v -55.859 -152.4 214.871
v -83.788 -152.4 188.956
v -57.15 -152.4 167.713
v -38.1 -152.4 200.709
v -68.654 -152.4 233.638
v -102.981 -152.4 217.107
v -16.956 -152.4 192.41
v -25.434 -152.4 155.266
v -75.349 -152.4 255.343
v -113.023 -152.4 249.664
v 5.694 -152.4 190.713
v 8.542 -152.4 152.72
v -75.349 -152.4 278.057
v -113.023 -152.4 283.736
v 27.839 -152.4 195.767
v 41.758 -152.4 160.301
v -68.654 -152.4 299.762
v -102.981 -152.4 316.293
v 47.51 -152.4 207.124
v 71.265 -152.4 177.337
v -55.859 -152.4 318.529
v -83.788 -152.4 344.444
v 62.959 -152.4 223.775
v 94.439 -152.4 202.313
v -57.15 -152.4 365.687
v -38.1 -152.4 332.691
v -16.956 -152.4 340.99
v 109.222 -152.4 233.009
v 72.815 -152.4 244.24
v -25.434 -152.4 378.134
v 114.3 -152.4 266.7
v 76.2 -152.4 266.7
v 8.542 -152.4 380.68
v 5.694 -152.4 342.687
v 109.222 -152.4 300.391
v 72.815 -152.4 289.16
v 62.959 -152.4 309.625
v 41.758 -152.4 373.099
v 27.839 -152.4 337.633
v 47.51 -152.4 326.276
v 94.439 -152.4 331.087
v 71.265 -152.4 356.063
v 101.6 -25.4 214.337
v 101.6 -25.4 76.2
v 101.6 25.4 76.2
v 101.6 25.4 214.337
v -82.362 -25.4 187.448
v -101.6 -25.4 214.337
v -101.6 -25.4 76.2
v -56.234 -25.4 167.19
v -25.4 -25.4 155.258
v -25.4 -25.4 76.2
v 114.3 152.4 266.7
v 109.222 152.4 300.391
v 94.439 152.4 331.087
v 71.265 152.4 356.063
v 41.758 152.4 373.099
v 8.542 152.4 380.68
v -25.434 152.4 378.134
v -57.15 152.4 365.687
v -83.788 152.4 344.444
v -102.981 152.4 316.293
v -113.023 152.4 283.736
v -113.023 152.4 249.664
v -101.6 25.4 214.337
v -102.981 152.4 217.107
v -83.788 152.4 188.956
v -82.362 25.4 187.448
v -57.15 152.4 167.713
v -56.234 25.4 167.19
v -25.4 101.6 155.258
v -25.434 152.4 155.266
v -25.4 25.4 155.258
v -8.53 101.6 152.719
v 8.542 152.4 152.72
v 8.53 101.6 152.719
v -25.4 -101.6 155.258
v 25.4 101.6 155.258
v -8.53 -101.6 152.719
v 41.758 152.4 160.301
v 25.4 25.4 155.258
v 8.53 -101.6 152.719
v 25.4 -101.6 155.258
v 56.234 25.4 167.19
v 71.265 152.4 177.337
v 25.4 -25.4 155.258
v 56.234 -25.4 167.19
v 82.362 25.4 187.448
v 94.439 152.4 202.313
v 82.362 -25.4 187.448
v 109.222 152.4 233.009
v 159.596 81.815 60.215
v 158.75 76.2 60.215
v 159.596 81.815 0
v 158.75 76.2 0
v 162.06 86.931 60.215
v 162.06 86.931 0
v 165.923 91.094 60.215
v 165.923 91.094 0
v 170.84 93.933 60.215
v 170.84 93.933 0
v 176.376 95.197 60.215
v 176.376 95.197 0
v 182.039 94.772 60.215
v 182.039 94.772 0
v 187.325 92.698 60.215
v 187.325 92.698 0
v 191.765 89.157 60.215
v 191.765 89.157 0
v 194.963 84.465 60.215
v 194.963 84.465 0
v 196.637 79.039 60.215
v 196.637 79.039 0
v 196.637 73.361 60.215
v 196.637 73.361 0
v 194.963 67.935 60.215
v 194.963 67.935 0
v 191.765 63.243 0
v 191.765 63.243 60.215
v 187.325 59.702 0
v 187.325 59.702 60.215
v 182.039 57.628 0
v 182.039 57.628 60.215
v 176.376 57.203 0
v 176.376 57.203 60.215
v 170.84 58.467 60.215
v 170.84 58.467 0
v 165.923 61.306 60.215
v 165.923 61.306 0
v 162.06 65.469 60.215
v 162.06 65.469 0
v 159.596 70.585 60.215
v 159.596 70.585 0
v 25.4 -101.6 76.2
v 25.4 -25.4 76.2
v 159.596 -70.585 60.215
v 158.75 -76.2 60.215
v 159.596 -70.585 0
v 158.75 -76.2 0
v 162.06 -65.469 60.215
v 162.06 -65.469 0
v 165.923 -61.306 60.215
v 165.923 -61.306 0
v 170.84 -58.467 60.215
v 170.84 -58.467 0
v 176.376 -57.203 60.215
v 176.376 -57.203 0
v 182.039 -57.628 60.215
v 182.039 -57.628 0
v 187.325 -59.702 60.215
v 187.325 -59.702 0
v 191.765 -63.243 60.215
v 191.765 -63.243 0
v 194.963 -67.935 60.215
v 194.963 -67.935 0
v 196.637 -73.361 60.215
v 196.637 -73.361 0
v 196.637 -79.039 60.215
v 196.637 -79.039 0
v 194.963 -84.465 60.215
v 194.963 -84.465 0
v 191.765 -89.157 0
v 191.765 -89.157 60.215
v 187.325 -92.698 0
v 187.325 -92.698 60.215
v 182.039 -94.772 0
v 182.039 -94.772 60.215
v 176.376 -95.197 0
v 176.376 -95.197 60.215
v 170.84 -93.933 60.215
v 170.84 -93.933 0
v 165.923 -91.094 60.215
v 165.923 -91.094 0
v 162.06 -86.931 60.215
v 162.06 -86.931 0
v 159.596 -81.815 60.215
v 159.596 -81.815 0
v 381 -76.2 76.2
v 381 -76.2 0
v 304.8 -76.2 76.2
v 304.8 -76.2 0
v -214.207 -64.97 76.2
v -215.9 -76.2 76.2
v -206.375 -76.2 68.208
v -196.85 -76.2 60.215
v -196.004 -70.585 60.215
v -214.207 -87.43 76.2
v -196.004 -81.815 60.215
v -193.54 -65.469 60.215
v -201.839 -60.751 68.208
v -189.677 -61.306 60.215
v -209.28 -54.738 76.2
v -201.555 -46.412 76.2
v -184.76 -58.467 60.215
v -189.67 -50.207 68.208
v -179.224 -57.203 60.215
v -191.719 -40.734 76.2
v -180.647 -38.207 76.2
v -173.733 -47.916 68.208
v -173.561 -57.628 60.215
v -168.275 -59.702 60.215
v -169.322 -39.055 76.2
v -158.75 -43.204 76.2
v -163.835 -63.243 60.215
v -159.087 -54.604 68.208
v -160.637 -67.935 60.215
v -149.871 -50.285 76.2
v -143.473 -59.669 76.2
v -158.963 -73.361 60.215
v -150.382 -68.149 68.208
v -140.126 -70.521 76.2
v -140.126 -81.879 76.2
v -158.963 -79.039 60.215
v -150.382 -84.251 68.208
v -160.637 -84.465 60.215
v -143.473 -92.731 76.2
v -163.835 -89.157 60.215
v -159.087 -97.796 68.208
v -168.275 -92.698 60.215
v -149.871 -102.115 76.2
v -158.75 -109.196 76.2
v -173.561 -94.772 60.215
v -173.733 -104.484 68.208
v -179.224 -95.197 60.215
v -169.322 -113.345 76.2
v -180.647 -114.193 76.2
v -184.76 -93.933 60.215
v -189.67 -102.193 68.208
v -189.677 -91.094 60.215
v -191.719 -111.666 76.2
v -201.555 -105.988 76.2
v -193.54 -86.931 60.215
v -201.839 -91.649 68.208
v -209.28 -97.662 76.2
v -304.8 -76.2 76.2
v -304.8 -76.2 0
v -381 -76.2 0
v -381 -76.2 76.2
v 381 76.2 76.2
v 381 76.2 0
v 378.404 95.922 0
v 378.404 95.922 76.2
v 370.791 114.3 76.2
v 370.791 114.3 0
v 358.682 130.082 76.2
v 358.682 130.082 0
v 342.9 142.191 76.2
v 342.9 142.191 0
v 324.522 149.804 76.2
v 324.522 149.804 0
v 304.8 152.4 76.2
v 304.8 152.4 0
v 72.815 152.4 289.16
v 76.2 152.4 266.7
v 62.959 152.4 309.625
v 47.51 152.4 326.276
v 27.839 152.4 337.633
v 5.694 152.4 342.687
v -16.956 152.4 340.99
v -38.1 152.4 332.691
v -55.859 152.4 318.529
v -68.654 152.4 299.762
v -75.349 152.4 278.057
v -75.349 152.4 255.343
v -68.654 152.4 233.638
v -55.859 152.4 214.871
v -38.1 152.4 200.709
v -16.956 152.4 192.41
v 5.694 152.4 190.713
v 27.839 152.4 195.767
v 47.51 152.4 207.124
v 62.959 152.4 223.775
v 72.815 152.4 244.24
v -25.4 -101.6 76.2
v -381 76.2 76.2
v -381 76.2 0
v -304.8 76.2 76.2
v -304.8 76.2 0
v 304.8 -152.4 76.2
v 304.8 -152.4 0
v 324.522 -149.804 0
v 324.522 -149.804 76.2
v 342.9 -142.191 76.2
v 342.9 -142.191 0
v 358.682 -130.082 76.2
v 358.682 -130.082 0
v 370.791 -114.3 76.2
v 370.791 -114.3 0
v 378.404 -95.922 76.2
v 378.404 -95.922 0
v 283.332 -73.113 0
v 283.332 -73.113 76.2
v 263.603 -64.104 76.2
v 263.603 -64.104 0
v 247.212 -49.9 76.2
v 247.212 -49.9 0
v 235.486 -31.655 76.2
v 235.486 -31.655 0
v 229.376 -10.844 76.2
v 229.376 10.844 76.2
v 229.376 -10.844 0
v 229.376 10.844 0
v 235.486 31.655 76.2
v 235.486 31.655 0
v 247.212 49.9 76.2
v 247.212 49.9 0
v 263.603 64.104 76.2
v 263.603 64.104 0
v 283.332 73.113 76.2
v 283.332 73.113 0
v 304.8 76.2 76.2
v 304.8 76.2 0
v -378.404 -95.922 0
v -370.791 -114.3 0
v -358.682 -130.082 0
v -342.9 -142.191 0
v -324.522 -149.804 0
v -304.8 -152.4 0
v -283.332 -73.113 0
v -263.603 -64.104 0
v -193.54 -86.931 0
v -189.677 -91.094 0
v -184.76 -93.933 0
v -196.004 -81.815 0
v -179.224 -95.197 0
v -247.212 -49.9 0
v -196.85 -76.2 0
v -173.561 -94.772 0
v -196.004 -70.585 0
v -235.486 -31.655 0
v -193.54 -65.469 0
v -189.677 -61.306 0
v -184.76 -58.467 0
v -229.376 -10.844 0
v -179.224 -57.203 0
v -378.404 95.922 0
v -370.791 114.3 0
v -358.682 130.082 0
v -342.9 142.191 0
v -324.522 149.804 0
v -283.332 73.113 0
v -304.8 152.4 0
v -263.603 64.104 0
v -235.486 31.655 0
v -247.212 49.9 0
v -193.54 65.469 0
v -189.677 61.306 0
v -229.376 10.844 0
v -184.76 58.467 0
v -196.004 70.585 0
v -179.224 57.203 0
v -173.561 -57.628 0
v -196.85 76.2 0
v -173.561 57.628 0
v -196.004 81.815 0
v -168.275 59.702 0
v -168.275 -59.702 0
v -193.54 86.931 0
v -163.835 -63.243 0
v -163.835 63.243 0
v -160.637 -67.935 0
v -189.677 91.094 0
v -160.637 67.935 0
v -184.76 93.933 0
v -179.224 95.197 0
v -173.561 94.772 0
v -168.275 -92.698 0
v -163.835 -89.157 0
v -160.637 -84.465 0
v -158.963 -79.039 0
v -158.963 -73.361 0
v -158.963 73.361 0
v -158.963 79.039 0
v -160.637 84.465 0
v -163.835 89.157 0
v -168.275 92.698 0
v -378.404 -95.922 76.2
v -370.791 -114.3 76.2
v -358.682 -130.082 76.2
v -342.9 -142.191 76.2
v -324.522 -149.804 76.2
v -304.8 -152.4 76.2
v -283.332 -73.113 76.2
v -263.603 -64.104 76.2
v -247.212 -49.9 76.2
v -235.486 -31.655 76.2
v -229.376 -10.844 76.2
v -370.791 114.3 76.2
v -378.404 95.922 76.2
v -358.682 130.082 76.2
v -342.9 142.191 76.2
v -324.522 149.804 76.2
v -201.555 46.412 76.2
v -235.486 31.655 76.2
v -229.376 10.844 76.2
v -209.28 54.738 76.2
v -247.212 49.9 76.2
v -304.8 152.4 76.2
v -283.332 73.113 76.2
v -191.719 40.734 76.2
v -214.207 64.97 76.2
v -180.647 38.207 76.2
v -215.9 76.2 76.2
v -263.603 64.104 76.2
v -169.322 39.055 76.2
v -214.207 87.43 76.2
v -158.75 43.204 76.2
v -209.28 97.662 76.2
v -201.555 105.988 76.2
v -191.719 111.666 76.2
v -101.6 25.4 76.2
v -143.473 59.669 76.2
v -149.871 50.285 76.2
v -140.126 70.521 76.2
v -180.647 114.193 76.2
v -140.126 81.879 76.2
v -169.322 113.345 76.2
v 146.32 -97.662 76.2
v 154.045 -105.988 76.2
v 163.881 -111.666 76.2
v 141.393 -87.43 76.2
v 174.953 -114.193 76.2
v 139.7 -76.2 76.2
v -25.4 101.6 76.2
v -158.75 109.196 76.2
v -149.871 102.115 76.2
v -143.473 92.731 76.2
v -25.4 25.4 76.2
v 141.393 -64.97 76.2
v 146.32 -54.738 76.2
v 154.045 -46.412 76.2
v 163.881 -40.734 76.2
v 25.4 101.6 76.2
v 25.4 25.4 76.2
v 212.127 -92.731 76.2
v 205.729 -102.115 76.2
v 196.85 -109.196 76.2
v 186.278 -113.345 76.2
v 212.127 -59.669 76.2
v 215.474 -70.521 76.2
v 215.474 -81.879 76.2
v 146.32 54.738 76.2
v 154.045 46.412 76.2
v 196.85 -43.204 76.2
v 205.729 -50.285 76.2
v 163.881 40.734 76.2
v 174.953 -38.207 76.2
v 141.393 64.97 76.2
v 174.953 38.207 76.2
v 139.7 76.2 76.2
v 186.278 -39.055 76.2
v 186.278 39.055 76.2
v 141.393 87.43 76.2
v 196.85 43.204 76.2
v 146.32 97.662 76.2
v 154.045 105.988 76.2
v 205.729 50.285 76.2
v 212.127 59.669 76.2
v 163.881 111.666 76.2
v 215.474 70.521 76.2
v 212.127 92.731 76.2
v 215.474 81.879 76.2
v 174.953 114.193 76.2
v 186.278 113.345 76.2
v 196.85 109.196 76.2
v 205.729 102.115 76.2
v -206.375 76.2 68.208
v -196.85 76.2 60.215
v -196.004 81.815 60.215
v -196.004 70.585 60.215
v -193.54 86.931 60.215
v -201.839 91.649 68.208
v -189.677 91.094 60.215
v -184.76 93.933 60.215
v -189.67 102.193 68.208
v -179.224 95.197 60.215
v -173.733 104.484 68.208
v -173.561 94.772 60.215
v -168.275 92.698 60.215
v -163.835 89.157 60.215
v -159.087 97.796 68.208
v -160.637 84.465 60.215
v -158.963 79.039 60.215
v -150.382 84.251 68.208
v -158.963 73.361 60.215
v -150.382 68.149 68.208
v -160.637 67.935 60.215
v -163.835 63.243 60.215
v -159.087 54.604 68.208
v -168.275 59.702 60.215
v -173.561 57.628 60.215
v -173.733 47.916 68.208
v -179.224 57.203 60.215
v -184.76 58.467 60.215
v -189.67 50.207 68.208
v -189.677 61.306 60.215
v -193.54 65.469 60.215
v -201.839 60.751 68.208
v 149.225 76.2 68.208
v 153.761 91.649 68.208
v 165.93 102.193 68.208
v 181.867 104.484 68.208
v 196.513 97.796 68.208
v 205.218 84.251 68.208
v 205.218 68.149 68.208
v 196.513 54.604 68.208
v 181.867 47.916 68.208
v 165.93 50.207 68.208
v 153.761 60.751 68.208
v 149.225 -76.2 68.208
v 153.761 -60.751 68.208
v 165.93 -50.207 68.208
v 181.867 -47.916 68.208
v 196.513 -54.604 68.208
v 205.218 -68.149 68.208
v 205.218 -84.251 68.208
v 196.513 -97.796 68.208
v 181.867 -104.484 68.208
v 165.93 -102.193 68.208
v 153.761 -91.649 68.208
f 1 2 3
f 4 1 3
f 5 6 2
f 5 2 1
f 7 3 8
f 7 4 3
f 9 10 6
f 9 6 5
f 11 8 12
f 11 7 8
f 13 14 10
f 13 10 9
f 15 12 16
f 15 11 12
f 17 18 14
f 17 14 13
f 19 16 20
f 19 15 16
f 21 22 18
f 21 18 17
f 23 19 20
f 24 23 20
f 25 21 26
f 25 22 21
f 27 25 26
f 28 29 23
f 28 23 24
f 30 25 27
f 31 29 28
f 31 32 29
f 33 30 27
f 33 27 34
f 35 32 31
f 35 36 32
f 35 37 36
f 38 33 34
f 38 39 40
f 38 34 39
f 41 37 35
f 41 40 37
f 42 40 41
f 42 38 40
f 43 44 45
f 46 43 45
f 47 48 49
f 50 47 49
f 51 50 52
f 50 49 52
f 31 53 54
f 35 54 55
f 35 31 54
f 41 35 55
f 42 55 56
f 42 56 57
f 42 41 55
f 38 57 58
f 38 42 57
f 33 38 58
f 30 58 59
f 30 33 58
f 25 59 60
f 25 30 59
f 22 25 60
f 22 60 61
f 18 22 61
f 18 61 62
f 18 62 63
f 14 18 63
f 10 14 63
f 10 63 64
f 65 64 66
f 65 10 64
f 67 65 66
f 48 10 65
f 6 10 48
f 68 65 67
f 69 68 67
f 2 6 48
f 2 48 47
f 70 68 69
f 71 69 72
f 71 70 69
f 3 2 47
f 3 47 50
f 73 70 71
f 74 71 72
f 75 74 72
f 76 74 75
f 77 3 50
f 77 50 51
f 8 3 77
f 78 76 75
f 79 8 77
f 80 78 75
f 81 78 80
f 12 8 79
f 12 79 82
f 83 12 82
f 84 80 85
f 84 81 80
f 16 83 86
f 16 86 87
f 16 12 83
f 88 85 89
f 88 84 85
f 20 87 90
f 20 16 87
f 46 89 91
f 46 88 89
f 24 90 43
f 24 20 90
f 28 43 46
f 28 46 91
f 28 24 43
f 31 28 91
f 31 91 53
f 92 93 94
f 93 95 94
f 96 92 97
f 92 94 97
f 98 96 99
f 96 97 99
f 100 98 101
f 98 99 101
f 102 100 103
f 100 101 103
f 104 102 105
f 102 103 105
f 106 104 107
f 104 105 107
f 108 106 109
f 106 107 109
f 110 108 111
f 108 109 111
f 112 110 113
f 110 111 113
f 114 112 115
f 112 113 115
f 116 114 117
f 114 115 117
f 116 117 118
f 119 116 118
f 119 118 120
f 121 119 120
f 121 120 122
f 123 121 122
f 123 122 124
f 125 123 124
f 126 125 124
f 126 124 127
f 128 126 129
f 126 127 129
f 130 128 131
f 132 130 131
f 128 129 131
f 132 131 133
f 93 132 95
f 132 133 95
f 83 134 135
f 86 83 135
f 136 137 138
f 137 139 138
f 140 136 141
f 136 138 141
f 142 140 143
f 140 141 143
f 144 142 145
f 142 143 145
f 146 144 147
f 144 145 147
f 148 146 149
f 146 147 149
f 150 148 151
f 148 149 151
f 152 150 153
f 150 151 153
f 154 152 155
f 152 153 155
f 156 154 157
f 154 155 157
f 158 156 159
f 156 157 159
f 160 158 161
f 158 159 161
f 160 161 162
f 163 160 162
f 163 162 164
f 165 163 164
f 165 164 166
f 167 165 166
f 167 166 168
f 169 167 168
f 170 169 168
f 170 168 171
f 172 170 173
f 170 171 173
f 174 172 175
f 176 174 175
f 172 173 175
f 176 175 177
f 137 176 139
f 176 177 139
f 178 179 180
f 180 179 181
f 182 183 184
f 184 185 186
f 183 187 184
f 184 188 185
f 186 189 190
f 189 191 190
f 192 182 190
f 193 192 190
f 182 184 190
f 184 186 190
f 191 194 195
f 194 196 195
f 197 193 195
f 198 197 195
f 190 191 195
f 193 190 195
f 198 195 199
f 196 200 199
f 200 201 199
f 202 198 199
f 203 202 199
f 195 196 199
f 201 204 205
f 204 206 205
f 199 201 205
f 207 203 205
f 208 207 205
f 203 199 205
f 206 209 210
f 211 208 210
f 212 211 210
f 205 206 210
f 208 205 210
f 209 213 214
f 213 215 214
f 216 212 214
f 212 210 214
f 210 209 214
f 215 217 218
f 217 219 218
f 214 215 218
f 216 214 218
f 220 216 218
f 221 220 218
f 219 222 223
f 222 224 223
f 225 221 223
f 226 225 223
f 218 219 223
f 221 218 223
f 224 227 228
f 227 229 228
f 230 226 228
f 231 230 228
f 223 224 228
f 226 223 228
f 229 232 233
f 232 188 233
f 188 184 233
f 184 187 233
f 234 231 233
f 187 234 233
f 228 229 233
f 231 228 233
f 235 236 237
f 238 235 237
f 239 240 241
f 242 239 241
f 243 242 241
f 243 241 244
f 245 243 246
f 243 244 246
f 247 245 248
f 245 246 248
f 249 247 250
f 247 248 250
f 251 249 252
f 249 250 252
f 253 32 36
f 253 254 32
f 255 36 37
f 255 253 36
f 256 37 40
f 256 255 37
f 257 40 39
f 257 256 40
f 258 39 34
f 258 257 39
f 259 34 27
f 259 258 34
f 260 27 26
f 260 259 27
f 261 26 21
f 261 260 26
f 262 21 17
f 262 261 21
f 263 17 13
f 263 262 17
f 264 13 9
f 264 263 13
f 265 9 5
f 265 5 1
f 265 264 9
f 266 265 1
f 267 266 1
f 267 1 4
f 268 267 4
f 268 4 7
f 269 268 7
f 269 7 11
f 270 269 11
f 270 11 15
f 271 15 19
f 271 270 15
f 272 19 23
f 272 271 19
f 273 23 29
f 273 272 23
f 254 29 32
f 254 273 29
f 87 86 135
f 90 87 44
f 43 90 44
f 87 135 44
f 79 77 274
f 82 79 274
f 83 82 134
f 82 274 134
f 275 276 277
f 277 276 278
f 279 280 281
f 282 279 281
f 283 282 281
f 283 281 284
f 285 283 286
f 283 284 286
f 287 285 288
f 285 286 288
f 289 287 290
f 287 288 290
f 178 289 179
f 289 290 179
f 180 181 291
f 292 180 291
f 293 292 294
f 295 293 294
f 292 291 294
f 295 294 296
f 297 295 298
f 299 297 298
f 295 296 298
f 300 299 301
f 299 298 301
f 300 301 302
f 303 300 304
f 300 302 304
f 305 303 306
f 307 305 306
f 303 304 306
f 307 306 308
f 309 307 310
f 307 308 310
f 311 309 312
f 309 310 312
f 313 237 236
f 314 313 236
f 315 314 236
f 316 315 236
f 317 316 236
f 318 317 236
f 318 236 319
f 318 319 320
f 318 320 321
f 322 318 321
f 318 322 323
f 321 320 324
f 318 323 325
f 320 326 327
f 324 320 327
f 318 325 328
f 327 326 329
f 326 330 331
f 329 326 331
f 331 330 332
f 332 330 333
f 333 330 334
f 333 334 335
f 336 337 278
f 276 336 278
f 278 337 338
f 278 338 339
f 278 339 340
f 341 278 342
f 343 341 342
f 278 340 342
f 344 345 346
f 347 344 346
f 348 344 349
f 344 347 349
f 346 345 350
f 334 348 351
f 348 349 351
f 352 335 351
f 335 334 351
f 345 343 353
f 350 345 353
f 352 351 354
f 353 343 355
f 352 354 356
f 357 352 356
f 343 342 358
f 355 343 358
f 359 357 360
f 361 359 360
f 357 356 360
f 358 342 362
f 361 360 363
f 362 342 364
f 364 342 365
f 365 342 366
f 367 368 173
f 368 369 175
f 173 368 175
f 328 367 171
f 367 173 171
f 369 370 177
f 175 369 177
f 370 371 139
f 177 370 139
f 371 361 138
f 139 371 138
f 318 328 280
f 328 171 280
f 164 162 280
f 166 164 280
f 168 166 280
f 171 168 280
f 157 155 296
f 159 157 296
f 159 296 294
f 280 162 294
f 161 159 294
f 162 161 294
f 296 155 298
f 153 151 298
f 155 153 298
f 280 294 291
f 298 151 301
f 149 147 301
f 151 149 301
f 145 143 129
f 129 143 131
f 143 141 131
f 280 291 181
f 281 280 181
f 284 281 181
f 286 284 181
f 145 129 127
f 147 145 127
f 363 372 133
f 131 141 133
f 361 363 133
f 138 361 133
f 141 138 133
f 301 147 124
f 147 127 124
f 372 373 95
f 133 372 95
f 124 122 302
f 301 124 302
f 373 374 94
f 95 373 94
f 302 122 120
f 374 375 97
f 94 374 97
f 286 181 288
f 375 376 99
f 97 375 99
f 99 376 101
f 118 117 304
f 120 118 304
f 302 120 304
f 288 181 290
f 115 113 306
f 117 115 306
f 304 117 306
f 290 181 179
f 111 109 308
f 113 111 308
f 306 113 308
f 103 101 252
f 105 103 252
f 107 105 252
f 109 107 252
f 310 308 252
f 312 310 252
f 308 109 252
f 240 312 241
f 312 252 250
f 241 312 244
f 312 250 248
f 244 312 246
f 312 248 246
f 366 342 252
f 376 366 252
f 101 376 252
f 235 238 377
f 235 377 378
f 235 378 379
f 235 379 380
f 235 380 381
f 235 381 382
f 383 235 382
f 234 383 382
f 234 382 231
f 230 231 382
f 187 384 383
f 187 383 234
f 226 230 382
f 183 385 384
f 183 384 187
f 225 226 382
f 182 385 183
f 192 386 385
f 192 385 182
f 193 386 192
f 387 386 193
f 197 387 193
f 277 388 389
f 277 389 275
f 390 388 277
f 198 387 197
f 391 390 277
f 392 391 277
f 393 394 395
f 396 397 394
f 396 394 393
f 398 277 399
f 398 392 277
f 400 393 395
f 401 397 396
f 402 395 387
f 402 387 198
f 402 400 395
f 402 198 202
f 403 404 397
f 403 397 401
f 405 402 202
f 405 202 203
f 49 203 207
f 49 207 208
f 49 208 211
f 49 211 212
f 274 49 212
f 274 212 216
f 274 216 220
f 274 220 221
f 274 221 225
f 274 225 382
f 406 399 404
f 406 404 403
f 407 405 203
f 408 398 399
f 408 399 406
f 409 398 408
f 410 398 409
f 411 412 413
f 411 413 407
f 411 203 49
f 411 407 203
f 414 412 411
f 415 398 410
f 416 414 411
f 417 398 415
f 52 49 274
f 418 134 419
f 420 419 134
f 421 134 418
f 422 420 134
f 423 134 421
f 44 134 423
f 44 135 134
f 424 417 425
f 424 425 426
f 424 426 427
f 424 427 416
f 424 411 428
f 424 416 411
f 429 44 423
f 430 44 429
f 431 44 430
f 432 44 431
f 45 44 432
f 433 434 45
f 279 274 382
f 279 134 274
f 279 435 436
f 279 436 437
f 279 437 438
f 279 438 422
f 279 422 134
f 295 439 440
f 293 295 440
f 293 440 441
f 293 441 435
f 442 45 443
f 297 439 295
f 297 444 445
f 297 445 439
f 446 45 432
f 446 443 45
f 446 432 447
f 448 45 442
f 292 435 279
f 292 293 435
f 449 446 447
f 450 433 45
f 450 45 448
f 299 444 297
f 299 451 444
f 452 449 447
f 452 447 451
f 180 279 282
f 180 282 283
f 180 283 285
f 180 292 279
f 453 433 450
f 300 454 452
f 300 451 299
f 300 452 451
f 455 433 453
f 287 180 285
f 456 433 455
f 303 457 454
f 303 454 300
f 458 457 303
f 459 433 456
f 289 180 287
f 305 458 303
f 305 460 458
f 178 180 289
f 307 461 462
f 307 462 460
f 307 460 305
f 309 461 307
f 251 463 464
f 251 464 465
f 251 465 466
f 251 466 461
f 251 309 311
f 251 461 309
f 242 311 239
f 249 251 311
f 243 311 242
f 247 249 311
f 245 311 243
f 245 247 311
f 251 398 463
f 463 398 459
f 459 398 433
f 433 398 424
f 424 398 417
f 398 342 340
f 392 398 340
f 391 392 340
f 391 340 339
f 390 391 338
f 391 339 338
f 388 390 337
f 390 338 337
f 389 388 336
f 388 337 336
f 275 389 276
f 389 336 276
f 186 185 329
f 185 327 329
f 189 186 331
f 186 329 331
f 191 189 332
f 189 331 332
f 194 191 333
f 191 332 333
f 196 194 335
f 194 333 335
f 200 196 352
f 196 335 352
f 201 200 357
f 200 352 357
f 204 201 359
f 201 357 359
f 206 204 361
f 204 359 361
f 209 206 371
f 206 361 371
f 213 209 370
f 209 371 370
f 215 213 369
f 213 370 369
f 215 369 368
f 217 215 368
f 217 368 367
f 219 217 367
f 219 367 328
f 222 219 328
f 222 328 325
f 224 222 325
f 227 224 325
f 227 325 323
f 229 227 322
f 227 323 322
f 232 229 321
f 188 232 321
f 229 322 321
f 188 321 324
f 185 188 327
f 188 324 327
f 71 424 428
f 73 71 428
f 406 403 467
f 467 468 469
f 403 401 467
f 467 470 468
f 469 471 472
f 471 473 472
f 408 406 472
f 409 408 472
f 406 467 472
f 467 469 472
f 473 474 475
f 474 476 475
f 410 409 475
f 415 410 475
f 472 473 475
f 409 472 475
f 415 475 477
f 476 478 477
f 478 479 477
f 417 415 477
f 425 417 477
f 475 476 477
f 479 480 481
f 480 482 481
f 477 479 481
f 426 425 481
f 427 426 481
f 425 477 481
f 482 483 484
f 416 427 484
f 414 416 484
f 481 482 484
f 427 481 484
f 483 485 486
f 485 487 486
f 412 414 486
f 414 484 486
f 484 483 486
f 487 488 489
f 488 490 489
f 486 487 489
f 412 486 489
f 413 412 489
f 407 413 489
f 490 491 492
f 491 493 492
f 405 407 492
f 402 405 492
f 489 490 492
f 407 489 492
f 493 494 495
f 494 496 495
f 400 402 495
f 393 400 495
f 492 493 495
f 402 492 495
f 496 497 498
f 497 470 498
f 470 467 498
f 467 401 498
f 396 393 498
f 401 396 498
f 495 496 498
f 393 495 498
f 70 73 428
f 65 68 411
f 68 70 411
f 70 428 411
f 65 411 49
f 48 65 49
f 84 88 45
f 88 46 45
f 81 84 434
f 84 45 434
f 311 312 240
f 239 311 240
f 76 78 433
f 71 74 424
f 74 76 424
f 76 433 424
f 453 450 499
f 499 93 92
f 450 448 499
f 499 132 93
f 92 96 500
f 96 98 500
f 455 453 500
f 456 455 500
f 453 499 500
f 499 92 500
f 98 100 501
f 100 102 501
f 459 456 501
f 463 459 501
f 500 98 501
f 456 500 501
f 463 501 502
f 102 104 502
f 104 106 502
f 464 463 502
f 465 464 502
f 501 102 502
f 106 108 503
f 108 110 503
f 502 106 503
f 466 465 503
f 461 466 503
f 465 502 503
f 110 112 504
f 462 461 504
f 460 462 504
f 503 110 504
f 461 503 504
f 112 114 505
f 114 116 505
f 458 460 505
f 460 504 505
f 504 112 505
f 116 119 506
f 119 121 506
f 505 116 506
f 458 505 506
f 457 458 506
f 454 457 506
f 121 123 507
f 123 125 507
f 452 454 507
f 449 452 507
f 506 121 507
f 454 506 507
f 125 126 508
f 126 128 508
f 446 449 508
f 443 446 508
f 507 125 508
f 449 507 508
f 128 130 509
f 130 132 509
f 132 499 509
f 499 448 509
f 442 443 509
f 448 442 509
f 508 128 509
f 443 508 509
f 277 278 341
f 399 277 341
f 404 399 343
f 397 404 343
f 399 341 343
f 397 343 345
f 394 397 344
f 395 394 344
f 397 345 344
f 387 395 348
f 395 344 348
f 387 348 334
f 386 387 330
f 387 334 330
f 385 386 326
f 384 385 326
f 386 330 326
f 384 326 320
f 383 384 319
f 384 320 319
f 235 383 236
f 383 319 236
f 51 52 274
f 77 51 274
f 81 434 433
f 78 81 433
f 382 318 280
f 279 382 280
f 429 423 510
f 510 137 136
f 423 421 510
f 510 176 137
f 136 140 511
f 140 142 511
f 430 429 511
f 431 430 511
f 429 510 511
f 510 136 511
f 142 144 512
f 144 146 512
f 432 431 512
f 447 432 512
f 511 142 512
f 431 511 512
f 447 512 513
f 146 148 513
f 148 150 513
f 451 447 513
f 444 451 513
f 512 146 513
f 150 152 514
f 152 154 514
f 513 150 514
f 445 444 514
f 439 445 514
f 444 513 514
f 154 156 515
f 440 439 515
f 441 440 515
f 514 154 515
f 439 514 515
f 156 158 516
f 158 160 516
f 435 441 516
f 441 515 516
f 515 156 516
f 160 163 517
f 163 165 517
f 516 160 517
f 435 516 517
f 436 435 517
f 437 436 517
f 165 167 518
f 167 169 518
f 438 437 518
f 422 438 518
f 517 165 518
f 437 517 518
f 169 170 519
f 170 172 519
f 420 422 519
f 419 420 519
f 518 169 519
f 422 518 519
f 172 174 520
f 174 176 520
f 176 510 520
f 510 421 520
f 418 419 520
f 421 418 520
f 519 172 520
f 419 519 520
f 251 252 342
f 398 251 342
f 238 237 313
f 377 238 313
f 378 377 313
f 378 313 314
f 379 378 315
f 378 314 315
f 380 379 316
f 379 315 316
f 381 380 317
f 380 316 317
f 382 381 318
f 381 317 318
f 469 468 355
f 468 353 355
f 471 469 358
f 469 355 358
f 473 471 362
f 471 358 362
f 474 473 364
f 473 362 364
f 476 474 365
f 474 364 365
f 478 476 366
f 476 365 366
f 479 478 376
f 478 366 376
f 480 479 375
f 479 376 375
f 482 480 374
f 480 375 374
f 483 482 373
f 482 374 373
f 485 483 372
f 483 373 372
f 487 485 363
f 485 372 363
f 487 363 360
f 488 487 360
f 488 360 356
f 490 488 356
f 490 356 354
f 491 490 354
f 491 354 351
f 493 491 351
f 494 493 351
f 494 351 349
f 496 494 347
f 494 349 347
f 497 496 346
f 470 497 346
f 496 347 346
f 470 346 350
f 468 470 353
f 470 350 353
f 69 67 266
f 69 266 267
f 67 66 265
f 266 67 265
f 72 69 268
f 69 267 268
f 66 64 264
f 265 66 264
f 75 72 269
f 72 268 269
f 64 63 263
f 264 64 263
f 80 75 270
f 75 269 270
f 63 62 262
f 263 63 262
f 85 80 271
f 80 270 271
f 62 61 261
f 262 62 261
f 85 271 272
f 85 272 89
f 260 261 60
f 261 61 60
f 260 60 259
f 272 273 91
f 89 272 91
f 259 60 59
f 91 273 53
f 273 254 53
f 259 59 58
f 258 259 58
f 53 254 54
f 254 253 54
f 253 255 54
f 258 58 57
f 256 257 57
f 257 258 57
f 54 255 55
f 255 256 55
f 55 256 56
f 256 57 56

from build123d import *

# Parameters (mm, degrees)
F0_R           = 38.1
F1_DEPTH       = 76.2
F2_DEPTH       = 266.7
F4_D           = 38.1
F4_CSINK_D     = 76.2
F4_CSINK_ANGLE = 100
F5_R           = 114.3
F5_R_2         = 76.2
F6_DEPTH       = 152.4
F7_DEPTH       = 152.4


with BuildPart() as f1:
    # F0 (on Top) → F1 (new body)
    with BuildSketch(Plane.XY):
        with BuildLine():
            ThreePointArc((-304.8, 76.2), (-228.6, 0), (-304.8, -76.2))
            Line((-304.8, -76.2), (-381, -76.2))
            ThreePointArc((-381, -76.2), (-358.681537, -130.081537), (-304.8, -152.4))
            Line((-304.8, -152.4), (304.8, -152.4))
            ThreePointArc((304.8, -152.4), (358.681537, -130.081537), (381, -76.2))
            Line((381, -76.2), (304.8, -76.2))
            ThreePointArc((304.8, -76.2), (228.6, 0), (304.8, 76.2))
            Line((304.8, 76.2), (381, 76.2))
            ThreePointArc((381, 76.2), (358.681537, 130.081537), (304.8, 152.4))
            Line((304.8, 152.4), (-304.8, 152.4))
            ThreePointArc((-304.8, 152.4), (-358.681537, 130.081537), (-381, 76.2))
            Line((-381, 76.2), (-304.8, 76.2))
        make_face()
        with Locations((-177.8, -76.2)):
            Circle(F0_R, mode=Mode.SUBTRACT)
        with Locations((177.8, -76.2)):
            Circle(F0_R, mode=Mode.SUBTRACT)
        with Locations((-177.8, 76.2)):
            Circle(F0_R, mode=Mode.SUBTRACT)
        Polygon((101.6, 25.4), (101.6, -25.4), (25.4, -25.4), (25.4, -101.6), (-25.4, -101.6), (-25.4, -25.4), (-101.6, -25.4), (-101.6, 25.4), (-25.4, 25.4), (-25.4, 101.6), (25.4, 101.6), (25.4, 25.4), align=None, mode=Mode.SUBTRACT)
        with Locations((177.8, 76.2)):
            Circle(F0_R, mode=Mode.SUBTRACT)
        with Locations((-177.8, 76.2)):
            Circle(F0_R)
        with Locations((-177.8, -76.2)):
            Circle(F0_R)
        with Locations((177.8, -76.2)):
            Circle(F0_R)
        with Locations((177.8, 76.2)):
            Circle(F0_R)
    extrude(amount=F1_DEPTH)

    # F0 (on Top) → F2 (join)
    with BuildSketch(Plane.XY):
        Polygon((25.4, -25.4), (101.6, -25.4), (101.6, 25.4), (25.4, 25.4), (25.4, 101.6), (-25.4, 101.6), (-25.4, 25.4), (-101.6, 25.4), (-101.6, -25.4), (-25.4, -25.4), (-25.4, -101.6), (25.4, -101.6), align=None)
    extrude(amount=F2_DEPTH)

    # F4 (through all)
    with Locations(Plane.XY.offset(76.2)):
        with Locations((-177.8, -76.2), (-177.8, 76.2), (177.8, 76.2), (177.8, -76.2)):
            CounterSinkHole(F4_D / 2, F4_CSINK_D / 2, counter_sink_angle=F4_CSINK_ANGLE)

    # F5 (on Front) → F6 (join, symmetric)
    with BuildSketch(Plane.XZ):
        with Locations((0, 266.7)):
            Circle(F5_R)
        with Locations((0, 266.7)):
            Circle(F5_R_2, mode=Mode.SUBTRACT)
    extrude(amount=F6_DEPTH, both=True)

    # F5 (on Front) → F7 (cut, symmetric)
    with BuildSketch(Plane.XZ):
        with Locations((0, 266.7)):
            Circle(F5_R_2)
    extrude(amount=F7_DEPTH, both=True, mode=Mode.SUBTRACT)


solid = f1.part
